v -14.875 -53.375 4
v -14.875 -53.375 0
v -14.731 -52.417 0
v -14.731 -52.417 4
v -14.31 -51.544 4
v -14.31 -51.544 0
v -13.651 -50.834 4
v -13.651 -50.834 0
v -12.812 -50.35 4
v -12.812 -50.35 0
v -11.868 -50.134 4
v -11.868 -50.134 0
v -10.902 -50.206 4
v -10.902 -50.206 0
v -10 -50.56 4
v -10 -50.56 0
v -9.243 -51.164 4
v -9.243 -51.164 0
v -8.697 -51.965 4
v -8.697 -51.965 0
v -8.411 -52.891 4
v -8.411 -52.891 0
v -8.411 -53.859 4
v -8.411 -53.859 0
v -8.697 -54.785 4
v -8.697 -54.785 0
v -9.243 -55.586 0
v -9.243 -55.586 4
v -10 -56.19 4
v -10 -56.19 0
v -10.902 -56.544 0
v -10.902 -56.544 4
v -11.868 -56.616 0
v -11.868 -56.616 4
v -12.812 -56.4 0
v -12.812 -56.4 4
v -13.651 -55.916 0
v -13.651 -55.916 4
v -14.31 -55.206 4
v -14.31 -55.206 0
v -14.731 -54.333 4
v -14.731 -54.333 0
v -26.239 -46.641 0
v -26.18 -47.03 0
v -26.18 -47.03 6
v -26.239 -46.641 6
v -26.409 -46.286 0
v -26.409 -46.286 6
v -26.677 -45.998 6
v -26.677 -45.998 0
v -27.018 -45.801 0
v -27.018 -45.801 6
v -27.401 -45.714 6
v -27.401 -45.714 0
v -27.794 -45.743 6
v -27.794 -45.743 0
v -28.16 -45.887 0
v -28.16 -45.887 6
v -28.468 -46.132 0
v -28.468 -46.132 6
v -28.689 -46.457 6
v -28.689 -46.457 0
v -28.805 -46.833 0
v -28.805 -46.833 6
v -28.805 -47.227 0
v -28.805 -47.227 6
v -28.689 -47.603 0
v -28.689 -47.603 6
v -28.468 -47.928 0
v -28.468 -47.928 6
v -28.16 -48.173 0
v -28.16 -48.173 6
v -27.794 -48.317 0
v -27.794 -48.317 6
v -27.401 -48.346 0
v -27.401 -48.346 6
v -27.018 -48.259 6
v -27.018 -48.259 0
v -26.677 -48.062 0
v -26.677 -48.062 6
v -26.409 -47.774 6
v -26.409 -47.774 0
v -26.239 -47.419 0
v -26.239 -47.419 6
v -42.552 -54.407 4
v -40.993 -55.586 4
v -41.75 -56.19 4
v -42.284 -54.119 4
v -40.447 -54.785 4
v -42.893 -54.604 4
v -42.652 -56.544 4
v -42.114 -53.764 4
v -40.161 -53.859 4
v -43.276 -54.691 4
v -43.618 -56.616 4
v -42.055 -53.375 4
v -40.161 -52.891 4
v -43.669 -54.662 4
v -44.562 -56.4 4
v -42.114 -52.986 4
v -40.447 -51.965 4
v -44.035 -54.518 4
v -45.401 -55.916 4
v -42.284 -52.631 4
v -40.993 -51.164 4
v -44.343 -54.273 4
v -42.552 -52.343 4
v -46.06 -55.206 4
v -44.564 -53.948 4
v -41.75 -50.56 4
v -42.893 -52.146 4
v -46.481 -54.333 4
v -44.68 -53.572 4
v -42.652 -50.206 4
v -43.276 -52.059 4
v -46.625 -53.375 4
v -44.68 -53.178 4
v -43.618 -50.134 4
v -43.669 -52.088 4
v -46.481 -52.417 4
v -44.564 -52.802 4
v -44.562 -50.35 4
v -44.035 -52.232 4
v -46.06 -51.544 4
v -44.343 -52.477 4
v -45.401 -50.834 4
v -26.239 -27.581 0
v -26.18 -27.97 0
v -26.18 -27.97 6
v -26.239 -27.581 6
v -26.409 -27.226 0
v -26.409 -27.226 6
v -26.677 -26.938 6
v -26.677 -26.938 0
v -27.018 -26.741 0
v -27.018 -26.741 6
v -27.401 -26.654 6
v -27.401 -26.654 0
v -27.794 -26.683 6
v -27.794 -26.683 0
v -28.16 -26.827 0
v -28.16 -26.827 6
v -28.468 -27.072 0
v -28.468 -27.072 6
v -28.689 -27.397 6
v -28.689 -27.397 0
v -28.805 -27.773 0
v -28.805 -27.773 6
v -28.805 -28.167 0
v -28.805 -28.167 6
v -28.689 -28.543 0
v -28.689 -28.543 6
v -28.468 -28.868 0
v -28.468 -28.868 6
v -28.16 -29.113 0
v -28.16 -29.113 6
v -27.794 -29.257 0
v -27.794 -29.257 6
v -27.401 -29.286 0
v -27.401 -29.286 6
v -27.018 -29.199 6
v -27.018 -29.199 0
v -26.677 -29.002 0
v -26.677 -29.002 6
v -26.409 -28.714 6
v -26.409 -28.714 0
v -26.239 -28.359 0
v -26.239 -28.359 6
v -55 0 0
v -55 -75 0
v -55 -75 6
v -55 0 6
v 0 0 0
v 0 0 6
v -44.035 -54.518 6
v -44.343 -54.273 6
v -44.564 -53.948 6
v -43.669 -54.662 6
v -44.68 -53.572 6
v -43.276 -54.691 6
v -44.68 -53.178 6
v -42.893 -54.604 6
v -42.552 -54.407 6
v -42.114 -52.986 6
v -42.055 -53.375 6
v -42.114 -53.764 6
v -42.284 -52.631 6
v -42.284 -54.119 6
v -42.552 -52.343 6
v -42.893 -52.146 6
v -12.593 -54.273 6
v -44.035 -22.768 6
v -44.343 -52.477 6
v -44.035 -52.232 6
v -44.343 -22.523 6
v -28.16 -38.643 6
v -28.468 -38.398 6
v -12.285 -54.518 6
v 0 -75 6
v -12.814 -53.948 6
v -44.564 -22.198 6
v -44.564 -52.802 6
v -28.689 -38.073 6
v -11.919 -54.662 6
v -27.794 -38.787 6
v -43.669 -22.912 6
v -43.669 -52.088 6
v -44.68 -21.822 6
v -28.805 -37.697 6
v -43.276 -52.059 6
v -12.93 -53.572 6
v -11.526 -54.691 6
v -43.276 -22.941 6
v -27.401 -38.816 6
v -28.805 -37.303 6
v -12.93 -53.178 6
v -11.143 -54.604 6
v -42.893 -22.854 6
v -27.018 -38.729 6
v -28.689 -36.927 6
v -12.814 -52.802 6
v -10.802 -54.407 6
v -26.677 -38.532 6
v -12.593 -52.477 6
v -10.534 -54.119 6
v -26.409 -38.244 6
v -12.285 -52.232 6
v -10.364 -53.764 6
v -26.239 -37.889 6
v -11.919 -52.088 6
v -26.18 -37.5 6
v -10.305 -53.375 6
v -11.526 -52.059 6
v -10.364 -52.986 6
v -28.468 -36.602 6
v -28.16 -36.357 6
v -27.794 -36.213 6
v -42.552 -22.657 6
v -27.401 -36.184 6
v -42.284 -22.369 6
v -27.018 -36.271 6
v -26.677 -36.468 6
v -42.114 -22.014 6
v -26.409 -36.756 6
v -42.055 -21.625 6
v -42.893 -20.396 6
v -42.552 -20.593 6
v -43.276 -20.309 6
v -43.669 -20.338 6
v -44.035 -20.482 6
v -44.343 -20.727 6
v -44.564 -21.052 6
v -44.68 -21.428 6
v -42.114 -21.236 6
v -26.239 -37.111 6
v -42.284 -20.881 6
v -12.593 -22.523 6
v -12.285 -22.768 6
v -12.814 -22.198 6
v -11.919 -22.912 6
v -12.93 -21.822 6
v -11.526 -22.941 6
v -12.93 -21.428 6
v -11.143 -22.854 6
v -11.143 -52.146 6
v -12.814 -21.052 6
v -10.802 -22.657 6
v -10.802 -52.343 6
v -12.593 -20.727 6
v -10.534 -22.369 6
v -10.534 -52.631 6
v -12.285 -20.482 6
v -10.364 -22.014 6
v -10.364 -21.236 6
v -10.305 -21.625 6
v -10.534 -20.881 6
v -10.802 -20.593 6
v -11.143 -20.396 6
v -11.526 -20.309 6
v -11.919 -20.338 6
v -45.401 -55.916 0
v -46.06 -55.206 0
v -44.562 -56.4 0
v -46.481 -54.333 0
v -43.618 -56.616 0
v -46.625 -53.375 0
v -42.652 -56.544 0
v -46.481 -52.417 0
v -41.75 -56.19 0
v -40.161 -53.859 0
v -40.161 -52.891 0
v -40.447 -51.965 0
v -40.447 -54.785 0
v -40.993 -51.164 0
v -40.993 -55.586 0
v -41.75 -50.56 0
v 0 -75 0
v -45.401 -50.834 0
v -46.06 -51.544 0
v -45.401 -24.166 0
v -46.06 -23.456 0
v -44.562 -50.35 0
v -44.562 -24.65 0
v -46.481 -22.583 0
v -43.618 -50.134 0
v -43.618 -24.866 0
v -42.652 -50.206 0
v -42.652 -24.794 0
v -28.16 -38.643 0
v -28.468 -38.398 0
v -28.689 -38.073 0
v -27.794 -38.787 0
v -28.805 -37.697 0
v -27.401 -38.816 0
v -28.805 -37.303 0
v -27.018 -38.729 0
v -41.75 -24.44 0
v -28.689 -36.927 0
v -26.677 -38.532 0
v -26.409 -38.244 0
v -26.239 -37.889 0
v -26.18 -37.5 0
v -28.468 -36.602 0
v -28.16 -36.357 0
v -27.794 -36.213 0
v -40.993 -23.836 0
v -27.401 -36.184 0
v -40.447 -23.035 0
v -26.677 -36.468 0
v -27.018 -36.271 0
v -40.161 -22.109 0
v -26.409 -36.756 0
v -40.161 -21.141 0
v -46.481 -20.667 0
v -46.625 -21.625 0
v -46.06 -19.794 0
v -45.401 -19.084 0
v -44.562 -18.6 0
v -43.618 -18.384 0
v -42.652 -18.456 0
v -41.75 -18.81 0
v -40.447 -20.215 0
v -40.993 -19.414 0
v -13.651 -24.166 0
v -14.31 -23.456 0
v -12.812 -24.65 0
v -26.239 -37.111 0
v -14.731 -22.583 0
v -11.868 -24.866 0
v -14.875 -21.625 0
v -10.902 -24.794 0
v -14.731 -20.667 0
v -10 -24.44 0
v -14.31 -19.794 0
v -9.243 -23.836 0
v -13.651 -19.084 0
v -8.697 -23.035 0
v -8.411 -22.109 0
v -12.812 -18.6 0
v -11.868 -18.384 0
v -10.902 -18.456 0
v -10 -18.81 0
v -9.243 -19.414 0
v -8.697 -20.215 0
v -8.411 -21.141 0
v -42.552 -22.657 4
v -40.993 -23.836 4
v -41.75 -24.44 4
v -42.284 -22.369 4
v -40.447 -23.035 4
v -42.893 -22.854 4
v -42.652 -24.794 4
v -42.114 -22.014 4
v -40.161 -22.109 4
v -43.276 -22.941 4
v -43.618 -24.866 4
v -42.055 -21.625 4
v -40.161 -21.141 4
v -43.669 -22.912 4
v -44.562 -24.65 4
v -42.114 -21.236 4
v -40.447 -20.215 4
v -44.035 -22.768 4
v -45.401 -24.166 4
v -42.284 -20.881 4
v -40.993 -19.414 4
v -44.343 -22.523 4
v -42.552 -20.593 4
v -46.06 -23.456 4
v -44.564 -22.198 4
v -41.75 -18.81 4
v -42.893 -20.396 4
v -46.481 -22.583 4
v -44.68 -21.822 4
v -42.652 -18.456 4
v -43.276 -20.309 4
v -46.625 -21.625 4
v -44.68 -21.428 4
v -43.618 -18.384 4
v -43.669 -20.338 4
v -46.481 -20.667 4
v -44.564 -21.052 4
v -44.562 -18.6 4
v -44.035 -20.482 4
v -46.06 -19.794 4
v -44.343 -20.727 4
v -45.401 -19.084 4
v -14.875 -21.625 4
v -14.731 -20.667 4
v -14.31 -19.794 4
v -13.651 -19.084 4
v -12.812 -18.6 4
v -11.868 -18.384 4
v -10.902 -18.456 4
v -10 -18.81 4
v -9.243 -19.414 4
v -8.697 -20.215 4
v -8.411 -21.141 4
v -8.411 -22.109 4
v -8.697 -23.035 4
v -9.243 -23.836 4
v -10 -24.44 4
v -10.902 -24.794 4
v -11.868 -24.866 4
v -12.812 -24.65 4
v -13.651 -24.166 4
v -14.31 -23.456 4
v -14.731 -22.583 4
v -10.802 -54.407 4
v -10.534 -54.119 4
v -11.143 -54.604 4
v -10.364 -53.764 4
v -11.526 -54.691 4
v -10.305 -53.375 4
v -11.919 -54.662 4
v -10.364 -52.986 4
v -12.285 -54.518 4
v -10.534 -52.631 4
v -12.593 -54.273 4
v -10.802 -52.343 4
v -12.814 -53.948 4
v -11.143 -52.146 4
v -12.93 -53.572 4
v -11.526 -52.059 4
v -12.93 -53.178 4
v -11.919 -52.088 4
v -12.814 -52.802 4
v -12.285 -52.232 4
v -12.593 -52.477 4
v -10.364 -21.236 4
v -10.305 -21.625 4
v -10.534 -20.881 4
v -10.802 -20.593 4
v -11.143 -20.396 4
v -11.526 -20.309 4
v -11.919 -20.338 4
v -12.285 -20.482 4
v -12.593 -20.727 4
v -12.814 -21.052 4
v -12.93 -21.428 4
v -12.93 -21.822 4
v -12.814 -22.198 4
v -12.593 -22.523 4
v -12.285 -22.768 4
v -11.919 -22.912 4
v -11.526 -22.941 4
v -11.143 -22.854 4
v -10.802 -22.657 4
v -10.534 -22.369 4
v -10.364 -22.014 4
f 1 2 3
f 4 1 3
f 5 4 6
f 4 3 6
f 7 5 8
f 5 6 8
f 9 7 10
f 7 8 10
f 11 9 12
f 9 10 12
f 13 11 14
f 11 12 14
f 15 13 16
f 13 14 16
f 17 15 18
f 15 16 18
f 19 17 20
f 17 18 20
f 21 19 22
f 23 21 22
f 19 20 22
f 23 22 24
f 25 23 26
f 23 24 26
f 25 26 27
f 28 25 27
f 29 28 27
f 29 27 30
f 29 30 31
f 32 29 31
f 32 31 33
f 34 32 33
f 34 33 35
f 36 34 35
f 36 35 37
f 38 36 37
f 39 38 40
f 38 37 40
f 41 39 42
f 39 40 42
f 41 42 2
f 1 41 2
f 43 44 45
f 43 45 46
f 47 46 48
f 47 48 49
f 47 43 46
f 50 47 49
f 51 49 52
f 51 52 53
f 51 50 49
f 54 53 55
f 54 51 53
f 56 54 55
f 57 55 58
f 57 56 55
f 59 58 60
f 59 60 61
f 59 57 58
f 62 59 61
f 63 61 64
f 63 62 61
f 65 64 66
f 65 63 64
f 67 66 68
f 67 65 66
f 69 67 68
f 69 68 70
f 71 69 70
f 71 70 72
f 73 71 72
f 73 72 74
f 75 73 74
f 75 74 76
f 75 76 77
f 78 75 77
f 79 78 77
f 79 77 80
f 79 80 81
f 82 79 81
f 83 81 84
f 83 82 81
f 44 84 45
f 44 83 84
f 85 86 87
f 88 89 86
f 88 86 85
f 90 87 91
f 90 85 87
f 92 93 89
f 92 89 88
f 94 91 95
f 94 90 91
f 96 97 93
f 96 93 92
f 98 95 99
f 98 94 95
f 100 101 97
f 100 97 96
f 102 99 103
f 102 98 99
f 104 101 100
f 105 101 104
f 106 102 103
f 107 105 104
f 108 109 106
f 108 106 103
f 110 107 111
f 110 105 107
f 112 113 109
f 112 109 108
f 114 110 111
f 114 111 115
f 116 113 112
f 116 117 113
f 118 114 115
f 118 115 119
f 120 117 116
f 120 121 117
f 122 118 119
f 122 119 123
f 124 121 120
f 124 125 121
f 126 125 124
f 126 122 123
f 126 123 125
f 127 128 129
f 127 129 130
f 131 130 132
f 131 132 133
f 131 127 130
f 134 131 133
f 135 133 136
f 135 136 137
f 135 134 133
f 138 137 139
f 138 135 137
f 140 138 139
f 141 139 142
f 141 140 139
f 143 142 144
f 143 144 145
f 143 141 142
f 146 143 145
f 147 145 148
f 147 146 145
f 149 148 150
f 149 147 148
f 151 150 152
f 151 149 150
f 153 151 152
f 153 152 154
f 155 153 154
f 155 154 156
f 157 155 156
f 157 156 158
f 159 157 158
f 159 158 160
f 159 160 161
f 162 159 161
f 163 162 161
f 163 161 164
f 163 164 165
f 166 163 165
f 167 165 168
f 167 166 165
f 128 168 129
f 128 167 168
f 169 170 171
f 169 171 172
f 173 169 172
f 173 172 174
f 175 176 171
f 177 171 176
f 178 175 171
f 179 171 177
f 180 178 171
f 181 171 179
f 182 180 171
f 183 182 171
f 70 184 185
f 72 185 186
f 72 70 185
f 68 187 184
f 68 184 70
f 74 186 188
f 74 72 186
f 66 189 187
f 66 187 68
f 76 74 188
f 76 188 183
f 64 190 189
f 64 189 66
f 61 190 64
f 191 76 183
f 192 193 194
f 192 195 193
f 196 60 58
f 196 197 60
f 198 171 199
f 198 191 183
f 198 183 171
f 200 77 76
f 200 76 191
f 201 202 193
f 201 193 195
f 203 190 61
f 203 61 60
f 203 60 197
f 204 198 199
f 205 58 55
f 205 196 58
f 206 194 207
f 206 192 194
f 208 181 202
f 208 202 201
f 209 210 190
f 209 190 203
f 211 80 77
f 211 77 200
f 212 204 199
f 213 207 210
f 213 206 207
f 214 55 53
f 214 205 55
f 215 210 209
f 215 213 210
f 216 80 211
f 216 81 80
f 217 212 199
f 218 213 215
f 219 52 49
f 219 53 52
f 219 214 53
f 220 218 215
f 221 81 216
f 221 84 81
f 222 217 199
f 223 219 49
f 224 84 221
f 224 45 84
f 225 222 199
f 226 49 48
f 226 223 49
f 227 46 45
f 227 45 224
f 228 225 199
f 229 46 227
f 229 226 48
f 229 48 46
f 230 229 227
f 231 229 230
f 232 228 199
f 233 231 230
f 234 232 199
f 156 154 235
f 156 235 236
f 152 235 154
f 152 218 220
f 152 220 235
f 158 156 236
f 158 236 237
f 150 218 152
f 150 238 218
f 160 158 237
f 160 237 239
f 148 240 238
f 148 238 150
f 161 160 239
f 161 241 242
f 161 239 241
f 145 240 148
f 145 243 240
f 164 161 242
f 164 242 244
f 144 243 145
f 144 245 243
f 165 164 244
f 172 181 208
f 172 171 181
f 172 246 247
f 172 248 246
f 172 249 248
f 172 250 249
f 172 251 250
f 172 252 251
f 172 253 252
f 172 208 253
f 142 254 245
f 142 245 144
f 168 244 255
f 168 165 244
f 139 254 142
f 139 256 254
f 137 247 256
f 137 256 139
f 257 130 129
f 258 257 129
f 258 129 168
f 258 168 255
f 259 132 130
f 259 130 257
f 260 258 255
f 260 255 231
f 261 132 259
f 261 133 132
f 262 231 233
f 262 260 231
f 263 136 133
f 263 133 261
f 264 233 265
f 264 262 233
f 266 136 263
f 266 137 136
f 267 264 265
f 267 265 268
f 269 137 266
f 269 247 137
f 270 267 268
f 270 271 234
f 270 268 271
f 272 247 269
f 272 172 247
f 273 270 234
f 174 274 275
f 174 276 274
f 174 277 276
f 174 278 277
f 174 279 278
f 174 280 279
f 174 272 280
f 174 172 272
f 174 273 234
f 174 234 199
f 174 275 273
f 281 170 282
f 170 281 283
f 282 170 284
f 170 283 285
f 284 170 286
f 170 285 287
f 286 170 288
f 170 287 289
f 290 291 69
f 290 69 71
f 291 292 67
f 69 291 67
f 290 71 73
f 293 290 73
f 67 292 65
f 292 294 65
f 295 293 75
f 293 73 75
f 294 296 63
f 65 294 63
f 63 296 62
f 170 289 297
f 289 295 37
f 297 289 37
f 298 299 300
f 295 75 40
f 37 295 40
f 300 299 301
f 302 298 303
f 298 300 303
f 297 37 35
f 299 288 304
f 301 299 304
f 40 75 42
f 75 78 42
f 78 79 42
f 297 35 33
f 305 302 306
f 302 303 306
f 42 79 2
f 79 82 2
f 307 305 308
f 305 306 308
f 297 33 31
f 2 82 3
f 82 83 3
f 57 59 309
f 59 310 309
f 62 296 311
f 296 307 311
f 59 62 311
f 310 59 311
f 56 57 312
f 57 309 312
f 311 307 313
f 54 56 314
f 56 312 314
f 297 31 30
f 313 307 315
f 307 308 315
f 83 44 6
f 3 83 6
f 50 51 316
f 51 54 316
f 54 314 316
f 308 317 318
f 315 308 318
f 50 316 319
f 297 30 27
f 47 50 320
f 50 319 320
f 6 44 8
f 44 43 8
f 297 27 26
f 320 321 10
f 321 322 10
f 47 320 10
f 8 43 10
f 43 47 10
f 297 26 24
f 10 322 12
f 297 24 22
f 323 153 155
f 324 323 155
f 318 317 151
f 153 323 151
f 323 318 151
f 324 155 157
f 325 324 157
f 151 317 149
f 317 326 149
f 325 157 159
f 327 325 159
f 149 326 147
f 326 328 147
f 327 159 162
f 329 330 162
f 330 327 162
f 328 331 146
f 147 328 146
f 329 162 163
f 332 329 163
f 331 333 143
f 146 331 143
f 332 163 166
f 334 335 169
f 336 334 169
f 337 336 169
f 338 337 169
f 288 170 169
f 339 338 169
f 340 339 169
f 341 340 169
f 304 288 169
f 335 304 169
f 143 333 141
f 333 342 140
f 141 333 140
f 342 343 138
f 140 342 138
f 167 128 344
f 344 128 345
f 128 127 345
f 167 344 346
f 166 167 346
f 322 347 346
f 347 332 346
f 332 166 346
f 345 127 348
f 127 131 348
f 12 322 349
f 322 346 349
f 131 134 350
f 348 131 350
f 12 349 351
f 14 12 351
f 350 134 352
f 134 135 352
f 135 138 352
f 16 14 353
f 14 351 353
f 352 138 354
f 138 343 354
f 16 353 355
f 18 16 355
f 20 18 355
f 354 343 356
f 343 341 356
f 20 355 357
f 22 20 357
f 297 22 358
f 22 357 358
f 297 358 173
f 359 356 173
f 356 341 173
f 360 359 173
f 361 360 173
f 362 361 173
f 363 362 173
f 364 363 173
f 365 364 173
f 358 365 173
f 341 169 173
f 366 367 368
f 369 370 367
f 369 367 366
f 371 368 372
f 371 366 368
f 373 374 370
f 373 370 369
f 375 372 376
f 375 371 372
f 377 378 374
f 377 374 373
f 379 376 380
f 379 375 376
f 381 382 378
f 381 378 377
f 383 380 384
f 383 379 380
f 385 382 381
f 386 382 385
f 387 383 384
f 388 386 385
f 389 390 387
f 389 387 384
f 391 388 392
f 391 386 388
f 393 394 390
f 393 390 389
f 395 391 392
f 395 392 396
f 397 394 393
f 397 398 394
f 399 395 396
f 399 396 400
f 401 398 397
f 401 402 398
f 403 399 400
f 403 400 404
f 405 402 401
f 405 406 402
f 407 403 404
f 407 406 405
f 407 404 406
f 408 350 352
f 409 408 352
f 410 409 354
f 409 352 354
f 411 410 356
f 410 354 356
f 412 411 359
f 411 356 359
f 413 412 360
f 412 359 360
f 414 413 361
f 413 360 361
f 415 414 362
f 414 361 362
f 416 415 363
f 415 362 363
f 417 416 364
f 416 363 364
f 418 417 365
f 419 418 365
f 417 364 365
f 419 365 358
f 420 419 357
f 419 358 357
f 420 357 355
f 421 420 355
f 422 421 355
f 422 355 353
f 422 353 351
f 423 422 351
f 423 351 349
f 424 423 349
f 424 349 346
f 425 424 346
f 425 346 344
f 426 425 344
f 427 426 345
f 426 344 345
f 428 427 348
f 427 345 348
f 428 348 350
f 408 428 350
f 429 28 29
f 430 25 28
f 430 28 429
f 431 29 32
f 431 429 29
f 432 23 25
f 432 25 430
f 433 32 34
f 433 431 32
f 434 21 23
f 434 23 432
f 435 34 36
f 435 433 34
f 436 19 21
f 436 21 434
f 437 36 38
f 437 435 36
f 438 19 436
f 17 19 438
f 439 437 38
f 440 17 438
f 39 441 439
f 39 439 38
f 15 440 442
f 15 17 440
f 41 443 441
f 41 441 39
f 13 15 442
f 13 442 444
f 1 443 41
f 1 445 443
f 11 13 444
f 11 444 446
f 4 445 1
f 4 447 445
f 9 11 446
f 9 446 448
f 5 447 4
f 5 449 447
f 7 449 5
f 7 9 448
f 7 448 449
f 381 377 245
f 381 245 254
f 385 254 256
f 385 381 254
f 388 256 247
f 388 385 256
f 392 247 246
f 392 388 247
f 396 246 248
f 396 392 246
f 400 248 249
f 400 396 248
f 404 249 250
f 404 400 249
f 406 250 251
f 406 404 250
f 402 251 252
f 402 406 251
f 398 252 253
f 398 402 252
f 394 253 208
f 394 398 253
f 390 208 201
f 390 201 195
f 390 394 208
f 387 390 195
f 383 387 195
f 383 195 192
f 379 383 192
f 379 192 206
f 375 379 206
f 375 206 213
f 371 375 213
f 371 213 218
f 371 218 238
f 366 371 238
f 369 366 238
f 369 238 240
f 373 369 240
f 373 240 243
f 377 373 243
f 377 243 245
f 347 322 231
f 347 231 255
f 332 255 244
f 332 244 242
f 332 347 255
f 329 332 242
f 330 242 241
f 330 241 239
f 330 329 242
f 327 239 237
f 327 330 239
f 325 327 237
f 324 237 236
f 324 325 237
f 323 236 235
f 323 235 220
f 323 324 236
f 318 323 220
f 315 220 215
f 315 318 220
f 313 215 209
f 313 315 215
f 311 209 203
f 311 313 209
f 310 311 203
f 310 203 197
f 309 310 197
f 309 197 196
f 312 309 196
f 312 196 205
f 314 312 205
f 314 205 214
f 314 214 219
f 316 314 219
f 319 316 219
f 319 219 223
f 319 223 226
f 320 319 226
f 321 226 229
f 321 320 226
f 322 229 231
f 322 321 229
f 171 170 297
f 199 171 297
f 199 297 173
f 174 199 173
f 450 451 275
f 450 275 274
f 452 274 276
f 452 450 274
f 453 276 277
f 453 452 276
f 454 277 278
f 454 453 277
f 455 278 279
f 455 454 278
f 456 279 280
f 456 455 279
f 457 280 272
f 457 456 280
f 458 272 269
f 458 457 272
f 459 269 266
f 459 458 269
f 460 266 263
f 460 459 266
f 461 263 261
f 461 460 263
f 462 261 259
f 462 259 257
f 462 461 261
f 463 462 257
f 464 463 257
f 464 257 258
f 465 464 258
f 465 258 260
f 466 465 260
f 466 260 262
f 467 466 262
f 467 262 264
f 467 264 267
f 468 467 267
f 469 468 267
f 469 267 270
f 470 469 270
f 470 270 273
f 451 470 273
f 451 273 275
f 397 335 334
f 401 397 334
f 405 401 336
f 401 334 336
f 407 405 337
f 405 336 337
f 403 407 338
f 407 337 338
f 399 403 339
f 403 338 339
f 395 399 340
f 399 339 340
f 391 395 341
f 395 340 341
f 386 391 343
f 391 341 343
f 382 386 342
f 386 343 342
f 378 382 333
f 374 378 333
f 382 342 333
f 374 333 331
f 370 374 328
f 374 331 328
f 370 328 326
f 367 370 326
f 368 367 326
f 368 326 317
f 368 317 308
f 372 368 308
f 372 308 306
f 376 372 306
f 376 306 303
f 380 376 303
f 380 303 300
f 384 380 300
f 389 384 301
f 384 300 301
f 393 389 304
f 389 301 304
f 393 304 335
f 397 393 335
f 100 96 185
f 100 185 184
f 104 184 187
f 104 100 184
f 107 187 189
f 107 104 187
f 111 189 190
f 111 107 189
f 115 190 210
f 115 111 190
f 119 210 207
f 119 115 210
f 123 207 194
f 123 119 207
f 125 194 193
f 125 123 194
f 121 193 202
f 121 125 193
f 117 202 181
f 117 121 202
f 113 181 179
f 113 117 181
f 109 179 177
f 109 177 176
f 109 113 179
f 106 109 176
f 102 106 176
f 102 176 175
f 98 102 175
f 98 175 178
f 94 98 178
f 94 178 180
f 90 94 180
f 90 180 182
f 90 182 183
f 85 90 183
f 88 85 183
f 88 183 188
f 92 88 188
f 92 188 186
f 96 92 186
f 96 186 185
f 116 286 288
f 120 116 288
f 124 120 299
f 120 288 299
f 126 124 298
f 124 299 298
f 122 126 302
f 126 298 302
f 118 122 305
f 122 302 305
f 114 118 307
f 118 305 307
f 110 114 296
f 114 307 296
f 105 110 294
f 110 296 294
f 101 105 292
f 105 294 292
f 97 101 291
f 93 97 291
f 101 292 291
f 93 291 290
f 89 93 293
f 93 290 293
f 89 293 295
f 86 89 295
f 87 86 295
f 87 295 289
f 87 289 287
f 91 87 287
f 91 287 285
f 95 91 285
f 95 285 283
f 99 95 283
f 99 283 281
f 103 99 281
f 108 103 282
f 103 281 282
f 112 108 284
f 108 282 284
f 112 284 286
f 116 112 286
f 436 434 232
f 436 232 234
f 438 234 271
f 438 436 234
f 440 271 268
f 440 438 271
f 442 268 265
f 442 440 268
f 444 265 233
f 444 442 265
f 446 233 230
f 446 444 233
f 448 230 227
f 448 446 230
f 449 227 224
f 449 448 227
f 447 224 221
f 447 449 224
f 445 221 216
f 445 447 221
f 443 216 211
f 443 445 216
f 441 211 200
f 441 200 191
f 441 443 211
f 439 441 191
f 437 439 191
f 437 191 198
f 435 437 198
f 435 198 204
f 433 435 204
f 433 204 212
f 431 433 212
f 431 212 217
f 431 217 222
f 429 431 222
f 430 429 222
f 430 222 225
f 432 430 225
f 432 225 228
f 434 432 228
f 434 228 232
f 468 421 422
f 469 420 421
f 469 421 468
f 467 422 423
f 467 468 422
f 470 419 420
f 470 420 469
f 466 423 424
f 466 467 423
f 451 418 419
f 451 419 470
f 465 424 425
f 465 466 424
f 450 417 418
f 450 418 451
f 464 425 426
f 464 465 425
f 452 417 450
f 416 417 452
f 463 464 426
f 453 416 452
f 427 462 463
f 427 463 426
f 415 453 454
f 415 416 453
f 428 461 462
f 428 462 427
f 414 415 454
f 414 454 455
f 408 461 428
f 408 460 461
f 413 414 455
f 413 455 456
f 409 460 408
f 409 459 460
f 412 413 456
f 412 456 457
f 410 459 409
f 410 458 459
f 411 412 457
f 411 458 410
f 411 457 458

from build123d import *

# Parameters (mm, degrees)
SKETCH1_W           = 55
SKETCH1_H           = 75
SKETCH1_R           = 1.32
BOSS_EXTRUDE1_DEPTH = 6
SKETCH2_R           = 3.25
CUT_EXTRUDE1_DEPTH  = 4


with BuildPart() as part:
    # Sketch1 → Boss-Extrude1 (new body)
    with BuildSketch(Plane.XY):
        with Locations((-27.5, -37.5)):
            Rectangle(SKETCH1_W, SKETCH1_H)
        with Locations((-43.375, -21.625)):
            Circle(SKETCH1_R, mode=Mode.SUBTRACT)
        with Locations((-11.625, -21.625)):
            Circle(SKETCH1_R, mode=Mode.SUBTRACT)
        with Locations((-11.625, -53.375)):
            Circle(SKETCH1_R, mode=Mode.SUBTRACT)
        with Locations((-43.375, -53.375)):
            Circle(SKETCH1_R, mode=Mode.SUBTRACT)
        with Locations((-27.5, -27.97)):
            Circle(SKETCH1_R, mode=Mode.SUBTRACT)
        with Locations((-27.5, -37.5)):
            Circle(SKETCH1_R, mode=Mode.SUBTRACT)
        with Locations((-27.5, -47.03)):
            Circle(SKETCH1_R, mode=Mode.SUBTRACT)
    extrude(amount=BOSS_EXTRUDE1_DEPTH)

    # Sketch2 → Cut-Extrude1 (cut)
    with BuildSketch(Plane(origin=(0, 0, 0), x_dir=(-1, 0, 0), z_dir=(0, 0, -1))):
        with Locations((11.625, -21.625)):
            Circle(SKETCH2_R)
        with Locations((43.375, -21.625)):
            Circle(SKETCH2_R)
        with Locations((43.375, -53.375)):
            Circle(SKETCH2_R)
        with Locations((11.625, -53.375)):
            Circle(SKETCH2_R)
    extrude(amount=-CUT_EXTRUDE1_DEPTH, mode=Mode.SUBTRACT)


solid = part.part
